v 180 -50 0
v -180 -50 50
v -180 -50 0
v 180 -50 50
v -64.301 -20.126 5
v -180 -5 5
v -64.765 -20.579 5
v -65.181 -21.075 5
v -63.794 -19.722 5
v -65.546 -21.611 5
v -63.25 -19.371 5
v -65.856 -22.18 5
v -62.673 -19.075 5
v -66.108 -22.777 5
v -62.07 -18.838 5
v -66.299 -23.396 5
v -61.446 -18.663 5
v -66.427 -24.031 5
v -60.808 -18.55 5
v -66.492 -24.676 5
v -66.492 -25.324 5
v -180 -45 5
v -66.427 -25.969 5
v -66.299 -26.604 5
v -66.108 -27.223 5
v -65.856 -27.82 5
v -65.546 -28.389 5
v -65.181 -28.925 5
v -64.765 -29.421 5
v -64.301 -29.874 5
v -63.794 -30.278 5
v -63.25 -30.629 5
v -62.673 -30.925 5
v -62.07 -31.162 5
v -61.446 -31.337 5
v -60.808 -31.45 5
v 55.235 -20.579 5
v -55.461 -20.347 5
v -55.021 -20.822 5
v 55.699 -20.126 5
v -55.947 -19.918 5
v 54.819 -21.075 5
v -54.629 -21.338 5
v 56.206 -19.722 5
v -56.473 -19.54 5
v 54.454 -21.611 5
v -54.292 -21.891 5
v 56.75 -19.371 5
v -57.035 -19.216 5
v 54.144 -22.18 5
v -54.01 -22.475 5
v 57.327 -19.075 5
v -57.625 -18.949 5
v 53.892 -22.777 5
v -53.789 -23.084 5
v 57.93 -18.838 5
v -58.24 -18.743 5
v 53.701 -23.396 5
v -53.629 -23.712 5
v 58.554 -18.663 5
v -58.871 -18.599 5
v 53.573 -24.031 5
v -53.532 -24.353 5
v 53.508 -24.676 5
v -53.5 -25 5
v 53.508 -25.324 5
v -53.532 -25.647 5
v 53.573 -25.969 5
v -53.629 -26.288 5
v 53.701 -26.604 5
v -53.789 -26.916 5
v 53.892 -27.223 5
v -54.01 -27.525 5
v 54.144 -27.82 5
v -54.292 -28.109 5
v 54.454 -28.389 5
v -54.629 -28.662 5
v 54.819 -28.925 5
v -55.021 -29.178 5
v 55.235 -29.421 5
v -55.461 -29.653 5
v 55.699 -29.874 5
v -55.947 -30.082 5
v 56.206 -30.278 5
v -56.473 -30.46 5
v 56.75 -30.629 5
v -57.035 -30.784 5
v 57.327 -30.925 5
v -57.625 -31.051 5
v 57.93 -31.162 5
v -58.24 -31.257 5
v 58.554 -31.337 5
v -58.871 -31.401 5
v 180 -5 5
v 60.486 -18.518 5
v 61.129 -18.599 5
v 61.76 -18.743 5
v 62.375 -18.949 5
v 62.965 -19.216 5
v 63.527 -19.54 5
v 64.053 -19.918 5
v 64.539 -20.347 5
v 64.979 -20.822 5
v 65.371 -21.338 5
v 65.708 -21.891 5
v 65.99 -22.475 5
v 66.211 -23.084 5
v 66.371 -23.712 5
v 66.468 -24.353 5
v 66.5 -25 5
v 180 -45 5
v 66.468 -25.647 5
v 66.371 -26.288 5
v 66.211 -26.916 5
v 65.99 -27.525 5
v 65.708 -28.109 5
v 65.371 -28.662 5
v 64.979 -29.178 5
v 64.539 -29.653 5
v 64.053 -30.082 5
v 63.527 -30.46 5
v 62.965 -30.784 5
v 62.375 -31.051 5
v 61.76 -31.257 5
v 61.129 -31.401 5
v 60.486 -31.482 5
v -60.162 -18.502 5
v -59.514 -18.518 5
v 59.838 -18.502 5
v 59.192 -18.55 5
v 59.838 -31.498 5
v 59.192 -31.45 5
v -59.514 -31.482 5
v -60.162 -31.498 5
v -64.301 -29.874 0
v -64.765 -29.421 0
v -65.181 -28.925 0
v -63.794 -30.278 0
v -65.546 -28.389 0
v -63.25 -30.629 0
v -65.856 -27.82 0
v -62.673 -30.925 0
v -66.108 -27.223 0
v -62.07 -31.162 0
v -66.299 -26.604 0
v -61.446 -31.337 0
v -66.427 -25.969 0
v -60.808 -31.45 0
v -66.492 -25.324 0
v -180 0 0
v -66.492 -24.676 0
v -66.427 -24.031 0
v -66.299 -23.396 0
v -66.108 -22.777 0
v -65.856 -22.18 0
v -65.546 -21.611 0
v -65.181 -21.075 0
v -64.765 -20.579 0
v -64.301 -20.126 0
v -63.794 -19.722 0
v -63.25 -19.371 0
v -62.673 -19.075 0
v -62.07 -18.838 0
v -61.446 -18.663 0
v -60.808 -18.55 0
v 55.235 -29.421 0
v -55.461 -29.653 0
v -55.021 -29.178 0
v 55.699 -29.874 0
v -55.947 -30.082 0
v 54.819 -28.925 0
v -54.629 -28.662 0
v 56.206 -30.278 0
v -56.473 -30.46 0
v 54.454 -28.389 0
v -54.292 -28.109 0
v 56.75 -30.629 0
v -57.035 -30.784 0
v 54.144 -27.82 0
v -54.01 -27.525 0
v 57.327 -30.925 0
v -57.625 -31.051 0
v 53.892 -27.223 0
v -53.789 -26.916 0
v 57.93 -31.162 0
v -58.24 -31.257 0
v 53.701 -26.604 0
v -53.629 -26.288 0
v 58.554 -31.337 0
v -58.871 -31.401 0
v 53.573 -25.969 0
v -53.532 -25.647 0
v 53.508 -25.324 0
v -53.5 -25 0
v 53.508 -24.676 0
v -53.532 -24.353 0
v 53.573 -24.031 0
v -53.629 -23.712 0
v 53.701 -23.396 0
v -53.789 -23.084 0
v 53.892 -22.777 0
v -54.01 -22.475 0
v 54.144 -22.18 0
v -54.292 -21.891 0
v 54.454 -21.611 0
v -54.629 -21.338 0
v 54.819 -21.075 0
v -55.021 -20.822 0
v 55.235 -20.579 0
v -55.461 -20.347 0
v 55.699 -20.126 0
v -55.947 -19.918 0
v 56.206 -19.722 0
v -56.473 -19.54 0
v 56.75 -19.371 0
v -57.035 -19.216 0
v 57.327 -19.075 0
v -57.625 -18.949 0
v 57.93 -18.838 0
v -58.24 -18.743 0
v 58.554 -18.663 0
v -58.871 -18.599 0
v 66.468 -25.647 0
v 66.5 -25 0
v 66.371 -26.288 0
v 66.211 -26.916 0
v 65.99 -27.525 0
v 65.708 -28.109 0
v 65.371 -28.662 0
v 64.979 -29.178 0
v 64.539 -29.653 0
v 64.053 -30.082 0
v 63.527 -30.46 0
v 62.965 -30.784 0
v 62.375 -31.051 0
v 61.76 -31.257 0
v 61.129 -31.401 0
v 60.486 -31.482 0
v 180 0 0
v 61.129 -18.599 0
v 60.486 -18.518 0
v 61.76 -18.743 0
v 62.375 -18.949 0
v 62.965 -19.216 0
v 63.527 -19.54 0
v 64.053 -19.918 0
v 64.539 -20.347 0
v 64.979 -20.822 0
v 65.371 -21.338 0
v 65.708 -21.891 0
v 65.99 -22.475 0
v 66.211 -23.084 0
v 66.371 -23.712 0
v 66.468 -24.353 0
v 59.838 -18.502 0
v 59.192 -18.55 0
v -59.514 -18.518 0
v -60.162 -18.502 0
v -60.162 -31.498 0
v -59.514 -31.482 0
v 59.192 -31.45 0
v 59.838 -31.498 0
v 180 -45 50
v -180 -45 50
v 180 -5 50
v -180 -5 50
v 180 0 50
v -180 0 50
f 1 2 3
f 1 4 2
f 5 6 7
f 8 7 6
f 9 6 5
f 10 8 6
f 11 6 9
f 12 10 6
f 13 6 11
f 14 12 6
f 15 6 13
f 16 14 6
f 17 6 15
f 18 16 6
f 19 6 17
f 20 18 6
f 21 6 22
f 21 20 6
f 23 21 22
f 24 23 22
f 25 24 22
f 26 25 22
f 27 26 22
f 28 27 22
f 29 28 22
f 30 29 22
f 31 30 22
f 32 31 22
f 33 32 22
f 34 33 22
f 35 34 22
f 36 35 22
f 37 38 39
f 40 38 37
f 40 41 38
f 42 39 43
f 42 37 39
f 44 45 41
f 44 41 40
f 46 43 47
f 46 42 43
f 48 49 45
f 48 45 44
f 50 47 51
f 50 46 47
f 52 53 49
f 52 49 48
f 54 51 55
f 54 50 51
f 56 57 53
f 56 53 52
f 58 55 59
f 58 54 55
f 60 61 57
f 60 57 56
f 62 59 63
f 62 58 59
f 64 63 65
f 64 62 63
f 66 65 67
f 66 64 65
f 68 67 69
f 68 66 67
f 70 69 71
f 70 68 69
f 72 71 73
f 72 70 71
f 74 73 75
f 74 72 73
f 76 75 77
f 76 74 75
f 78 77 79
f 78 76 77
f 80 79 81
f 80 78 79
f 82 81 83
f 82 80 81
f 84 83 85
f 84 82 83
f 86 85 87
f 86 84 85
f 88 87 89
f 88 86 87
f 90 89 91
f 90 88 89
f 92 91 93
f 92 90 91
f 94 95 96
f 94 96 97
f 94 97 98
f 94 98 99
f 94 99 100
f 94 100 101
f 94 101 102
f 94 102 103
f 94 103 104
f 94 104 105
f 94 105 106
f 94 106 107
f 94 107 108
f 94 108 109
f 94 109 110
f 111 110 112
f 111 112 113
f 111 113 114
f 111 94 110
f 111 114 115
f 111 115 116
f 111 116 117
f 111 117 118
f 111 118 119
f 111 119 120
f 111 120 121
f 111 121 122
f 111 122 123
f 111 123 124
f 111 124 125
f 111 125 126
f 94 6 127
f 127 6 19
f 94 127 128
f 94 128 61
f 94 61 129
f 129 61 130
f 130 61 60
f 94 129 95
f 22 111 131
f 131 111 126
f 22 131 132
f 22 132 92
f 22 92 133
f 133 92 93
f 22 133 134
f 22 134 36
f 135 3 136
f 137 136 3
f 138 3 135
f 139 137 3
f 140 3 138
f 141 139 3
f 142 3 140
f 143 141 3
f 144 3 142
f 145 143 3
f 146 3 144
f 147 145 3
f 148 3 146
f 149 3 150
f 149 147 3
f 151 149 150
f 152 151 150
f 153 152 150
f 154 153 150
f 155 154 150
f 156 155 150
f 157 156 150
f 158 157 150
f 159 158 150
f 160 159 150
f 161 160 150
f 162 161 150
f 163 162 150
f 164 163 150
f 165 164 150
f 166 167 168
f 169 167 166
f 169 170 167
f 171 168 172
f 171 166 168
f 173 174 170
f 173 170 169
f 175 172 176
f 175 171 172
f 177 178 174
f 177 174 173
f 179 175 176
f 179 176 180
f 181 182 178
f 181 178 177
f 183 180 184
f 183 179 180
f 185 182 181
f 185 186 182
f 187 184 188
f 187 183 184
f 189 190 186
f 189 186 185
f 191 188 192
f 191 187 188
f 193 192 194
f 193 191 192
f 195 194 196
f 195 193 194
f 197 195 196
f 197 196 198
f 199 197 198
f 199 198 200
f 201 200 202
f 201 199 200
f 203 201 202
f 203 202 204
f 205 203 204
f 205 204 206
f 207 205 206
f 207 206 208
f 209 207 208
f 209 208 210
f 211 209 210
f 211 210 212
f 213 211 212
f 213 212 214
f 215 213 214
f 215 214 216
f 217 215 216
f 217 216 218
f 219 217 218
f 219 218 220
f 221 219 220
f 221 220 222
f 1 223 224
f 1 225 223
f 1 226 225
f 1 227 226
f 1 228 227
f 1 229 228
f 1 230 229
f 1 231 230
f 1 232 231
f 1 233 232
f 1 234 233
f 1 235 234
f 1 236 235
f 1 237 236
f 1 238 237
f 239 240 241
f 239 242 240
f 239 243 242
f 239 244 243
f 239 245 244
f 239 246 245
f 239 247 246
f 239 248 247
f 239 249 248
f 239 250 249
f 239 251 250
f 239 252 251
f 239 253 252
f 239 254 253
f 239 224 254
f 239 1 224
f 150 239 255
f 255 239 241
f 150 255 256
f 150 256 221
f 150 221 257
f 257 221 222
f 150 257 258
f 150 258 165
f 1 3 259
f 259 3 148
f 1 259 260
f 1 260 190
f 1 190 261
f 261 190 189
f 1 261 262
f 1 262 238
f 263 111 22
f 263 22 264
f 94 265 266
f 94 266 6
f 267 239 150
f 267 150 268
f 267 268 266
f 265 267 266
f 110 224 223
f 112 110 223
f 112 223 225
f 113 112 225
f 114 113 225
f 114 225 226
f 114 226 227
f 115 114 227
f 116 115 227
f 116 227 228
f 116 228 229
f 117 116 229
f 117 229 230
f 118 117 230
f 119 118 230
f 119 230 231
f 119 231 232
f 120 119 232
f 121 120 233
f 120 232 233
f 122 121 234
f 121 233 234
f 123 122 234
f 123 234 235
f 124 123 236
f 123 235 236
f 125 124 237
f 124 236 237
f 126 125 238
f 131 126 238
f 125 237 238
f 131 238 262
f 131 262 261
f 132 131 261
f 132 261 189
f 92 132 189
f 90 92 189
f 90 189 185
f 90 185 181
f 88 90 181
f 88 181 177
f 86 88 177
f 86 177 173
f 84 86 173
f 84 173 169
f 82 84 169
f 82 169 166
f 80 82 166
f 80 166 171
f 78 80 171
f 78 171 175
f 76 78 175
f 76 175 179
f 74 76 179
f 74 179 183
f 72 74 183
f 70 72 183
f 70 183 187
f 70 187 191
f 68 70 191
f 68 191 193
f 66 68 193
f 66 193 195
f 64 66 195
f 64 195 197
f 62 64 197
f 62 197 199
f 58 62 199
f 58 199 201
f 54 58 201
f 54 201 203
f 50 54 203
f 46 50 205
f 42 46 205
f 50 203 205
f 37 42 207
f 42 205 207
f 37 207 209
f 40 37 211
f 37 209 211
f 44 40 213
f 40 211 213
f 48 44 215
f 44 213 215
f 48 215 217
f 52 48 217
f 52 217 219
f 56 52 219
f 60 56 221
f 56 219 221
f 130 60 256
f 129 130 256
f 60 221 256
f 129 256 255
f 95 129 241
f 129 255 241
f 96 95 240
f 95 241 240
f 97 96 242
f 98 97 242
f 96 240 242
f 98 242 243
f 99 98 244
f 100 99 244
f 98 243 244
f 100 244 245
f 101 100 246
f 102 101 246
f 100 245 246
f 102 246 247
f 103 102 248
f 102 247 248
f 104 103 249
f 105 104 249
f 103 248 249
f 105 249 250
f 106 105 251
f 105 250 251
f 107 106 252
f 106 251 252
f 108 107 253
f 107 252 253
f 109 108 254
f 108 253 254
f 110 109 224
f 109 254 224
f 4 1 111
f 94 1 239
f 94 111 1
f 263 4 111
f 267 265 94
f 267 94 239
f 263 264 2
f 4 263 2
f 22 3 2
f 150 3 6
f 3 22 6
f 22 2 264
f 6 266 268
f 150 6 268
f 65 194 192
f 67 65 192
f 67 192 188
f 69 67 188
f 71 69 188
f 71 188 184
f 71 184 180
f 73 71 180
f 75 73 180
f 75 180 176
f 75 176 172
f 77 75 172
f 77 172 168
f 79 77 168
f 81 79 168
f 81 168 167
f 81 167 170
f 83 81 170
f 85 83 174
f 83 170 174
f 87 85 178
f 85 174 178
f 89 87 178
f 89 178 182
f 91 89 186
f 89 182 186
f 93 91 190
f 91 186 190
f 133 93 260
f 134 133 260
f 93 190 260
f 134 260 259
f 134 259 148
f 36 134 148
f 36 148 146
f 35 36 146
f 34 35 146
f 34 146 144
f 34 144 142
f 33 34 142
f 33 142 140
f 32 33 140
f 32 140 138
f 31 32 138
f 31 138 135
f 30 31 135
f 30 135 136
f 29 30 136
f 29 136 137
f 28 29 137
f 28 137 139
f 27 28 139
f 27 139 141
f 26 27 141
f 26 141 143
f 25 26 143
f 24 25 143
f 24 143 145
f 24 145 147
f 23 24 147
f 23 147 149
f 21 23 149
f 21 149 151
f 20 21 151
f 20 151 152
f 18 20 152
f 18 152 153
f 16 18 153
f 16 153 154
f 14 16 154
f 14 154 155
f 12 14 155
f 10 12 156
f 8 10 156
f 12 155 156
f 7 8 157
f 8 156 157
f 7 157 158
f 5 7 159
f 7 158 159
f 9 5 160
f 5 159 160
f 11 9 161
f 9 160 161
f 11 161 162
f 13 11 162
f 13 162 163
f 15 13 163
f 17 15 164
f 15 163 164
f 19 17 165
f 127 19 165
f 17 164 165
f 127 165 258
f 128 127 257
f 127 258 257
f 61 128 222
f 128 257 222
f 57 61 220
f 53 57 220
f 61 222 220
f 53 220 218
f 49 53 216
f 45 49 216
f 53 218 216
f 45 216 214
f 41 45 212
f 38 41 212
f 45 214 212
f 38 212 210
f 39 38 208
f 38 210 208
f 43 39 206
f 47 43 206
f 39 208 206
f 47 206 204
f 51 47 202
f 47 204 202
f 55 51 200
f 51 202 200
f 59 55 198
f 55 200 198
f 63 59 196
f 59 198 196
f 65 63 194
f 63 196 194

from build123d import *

# Parameters (mm, degrees)
F1_DEPTH = 180
F2_R     = 6.5
F3_DEPTH = 25


with BuildPart() as f1:
    # F0 (on Right) → F1 (new body, symmetric)
    with BuildSketch(Plane.YZ):
        Polygon((-50, 0), (0, 0), (0, 50), (-5, 50), (-5, 5), (-45, 5), (-45, 50), (-50, 50), align=None)
    extrude(amount=F1_DEPTH, both=True)

    # F2 (on face) → F3 (cut)
    with BuildSketch(Plane(origin=(0, 0, 0), x_dir=(1, 0, 0), z_dir=(0, 0, -1))):
        with Locations((-60, 25)):
            Circle(F2_R)
        with Locations((60, 25)):
            Circle(F2_R)
    extrude(amount=-F3_DEPTH, mode=Mode.SUBTRACT)


solid = f1.part
